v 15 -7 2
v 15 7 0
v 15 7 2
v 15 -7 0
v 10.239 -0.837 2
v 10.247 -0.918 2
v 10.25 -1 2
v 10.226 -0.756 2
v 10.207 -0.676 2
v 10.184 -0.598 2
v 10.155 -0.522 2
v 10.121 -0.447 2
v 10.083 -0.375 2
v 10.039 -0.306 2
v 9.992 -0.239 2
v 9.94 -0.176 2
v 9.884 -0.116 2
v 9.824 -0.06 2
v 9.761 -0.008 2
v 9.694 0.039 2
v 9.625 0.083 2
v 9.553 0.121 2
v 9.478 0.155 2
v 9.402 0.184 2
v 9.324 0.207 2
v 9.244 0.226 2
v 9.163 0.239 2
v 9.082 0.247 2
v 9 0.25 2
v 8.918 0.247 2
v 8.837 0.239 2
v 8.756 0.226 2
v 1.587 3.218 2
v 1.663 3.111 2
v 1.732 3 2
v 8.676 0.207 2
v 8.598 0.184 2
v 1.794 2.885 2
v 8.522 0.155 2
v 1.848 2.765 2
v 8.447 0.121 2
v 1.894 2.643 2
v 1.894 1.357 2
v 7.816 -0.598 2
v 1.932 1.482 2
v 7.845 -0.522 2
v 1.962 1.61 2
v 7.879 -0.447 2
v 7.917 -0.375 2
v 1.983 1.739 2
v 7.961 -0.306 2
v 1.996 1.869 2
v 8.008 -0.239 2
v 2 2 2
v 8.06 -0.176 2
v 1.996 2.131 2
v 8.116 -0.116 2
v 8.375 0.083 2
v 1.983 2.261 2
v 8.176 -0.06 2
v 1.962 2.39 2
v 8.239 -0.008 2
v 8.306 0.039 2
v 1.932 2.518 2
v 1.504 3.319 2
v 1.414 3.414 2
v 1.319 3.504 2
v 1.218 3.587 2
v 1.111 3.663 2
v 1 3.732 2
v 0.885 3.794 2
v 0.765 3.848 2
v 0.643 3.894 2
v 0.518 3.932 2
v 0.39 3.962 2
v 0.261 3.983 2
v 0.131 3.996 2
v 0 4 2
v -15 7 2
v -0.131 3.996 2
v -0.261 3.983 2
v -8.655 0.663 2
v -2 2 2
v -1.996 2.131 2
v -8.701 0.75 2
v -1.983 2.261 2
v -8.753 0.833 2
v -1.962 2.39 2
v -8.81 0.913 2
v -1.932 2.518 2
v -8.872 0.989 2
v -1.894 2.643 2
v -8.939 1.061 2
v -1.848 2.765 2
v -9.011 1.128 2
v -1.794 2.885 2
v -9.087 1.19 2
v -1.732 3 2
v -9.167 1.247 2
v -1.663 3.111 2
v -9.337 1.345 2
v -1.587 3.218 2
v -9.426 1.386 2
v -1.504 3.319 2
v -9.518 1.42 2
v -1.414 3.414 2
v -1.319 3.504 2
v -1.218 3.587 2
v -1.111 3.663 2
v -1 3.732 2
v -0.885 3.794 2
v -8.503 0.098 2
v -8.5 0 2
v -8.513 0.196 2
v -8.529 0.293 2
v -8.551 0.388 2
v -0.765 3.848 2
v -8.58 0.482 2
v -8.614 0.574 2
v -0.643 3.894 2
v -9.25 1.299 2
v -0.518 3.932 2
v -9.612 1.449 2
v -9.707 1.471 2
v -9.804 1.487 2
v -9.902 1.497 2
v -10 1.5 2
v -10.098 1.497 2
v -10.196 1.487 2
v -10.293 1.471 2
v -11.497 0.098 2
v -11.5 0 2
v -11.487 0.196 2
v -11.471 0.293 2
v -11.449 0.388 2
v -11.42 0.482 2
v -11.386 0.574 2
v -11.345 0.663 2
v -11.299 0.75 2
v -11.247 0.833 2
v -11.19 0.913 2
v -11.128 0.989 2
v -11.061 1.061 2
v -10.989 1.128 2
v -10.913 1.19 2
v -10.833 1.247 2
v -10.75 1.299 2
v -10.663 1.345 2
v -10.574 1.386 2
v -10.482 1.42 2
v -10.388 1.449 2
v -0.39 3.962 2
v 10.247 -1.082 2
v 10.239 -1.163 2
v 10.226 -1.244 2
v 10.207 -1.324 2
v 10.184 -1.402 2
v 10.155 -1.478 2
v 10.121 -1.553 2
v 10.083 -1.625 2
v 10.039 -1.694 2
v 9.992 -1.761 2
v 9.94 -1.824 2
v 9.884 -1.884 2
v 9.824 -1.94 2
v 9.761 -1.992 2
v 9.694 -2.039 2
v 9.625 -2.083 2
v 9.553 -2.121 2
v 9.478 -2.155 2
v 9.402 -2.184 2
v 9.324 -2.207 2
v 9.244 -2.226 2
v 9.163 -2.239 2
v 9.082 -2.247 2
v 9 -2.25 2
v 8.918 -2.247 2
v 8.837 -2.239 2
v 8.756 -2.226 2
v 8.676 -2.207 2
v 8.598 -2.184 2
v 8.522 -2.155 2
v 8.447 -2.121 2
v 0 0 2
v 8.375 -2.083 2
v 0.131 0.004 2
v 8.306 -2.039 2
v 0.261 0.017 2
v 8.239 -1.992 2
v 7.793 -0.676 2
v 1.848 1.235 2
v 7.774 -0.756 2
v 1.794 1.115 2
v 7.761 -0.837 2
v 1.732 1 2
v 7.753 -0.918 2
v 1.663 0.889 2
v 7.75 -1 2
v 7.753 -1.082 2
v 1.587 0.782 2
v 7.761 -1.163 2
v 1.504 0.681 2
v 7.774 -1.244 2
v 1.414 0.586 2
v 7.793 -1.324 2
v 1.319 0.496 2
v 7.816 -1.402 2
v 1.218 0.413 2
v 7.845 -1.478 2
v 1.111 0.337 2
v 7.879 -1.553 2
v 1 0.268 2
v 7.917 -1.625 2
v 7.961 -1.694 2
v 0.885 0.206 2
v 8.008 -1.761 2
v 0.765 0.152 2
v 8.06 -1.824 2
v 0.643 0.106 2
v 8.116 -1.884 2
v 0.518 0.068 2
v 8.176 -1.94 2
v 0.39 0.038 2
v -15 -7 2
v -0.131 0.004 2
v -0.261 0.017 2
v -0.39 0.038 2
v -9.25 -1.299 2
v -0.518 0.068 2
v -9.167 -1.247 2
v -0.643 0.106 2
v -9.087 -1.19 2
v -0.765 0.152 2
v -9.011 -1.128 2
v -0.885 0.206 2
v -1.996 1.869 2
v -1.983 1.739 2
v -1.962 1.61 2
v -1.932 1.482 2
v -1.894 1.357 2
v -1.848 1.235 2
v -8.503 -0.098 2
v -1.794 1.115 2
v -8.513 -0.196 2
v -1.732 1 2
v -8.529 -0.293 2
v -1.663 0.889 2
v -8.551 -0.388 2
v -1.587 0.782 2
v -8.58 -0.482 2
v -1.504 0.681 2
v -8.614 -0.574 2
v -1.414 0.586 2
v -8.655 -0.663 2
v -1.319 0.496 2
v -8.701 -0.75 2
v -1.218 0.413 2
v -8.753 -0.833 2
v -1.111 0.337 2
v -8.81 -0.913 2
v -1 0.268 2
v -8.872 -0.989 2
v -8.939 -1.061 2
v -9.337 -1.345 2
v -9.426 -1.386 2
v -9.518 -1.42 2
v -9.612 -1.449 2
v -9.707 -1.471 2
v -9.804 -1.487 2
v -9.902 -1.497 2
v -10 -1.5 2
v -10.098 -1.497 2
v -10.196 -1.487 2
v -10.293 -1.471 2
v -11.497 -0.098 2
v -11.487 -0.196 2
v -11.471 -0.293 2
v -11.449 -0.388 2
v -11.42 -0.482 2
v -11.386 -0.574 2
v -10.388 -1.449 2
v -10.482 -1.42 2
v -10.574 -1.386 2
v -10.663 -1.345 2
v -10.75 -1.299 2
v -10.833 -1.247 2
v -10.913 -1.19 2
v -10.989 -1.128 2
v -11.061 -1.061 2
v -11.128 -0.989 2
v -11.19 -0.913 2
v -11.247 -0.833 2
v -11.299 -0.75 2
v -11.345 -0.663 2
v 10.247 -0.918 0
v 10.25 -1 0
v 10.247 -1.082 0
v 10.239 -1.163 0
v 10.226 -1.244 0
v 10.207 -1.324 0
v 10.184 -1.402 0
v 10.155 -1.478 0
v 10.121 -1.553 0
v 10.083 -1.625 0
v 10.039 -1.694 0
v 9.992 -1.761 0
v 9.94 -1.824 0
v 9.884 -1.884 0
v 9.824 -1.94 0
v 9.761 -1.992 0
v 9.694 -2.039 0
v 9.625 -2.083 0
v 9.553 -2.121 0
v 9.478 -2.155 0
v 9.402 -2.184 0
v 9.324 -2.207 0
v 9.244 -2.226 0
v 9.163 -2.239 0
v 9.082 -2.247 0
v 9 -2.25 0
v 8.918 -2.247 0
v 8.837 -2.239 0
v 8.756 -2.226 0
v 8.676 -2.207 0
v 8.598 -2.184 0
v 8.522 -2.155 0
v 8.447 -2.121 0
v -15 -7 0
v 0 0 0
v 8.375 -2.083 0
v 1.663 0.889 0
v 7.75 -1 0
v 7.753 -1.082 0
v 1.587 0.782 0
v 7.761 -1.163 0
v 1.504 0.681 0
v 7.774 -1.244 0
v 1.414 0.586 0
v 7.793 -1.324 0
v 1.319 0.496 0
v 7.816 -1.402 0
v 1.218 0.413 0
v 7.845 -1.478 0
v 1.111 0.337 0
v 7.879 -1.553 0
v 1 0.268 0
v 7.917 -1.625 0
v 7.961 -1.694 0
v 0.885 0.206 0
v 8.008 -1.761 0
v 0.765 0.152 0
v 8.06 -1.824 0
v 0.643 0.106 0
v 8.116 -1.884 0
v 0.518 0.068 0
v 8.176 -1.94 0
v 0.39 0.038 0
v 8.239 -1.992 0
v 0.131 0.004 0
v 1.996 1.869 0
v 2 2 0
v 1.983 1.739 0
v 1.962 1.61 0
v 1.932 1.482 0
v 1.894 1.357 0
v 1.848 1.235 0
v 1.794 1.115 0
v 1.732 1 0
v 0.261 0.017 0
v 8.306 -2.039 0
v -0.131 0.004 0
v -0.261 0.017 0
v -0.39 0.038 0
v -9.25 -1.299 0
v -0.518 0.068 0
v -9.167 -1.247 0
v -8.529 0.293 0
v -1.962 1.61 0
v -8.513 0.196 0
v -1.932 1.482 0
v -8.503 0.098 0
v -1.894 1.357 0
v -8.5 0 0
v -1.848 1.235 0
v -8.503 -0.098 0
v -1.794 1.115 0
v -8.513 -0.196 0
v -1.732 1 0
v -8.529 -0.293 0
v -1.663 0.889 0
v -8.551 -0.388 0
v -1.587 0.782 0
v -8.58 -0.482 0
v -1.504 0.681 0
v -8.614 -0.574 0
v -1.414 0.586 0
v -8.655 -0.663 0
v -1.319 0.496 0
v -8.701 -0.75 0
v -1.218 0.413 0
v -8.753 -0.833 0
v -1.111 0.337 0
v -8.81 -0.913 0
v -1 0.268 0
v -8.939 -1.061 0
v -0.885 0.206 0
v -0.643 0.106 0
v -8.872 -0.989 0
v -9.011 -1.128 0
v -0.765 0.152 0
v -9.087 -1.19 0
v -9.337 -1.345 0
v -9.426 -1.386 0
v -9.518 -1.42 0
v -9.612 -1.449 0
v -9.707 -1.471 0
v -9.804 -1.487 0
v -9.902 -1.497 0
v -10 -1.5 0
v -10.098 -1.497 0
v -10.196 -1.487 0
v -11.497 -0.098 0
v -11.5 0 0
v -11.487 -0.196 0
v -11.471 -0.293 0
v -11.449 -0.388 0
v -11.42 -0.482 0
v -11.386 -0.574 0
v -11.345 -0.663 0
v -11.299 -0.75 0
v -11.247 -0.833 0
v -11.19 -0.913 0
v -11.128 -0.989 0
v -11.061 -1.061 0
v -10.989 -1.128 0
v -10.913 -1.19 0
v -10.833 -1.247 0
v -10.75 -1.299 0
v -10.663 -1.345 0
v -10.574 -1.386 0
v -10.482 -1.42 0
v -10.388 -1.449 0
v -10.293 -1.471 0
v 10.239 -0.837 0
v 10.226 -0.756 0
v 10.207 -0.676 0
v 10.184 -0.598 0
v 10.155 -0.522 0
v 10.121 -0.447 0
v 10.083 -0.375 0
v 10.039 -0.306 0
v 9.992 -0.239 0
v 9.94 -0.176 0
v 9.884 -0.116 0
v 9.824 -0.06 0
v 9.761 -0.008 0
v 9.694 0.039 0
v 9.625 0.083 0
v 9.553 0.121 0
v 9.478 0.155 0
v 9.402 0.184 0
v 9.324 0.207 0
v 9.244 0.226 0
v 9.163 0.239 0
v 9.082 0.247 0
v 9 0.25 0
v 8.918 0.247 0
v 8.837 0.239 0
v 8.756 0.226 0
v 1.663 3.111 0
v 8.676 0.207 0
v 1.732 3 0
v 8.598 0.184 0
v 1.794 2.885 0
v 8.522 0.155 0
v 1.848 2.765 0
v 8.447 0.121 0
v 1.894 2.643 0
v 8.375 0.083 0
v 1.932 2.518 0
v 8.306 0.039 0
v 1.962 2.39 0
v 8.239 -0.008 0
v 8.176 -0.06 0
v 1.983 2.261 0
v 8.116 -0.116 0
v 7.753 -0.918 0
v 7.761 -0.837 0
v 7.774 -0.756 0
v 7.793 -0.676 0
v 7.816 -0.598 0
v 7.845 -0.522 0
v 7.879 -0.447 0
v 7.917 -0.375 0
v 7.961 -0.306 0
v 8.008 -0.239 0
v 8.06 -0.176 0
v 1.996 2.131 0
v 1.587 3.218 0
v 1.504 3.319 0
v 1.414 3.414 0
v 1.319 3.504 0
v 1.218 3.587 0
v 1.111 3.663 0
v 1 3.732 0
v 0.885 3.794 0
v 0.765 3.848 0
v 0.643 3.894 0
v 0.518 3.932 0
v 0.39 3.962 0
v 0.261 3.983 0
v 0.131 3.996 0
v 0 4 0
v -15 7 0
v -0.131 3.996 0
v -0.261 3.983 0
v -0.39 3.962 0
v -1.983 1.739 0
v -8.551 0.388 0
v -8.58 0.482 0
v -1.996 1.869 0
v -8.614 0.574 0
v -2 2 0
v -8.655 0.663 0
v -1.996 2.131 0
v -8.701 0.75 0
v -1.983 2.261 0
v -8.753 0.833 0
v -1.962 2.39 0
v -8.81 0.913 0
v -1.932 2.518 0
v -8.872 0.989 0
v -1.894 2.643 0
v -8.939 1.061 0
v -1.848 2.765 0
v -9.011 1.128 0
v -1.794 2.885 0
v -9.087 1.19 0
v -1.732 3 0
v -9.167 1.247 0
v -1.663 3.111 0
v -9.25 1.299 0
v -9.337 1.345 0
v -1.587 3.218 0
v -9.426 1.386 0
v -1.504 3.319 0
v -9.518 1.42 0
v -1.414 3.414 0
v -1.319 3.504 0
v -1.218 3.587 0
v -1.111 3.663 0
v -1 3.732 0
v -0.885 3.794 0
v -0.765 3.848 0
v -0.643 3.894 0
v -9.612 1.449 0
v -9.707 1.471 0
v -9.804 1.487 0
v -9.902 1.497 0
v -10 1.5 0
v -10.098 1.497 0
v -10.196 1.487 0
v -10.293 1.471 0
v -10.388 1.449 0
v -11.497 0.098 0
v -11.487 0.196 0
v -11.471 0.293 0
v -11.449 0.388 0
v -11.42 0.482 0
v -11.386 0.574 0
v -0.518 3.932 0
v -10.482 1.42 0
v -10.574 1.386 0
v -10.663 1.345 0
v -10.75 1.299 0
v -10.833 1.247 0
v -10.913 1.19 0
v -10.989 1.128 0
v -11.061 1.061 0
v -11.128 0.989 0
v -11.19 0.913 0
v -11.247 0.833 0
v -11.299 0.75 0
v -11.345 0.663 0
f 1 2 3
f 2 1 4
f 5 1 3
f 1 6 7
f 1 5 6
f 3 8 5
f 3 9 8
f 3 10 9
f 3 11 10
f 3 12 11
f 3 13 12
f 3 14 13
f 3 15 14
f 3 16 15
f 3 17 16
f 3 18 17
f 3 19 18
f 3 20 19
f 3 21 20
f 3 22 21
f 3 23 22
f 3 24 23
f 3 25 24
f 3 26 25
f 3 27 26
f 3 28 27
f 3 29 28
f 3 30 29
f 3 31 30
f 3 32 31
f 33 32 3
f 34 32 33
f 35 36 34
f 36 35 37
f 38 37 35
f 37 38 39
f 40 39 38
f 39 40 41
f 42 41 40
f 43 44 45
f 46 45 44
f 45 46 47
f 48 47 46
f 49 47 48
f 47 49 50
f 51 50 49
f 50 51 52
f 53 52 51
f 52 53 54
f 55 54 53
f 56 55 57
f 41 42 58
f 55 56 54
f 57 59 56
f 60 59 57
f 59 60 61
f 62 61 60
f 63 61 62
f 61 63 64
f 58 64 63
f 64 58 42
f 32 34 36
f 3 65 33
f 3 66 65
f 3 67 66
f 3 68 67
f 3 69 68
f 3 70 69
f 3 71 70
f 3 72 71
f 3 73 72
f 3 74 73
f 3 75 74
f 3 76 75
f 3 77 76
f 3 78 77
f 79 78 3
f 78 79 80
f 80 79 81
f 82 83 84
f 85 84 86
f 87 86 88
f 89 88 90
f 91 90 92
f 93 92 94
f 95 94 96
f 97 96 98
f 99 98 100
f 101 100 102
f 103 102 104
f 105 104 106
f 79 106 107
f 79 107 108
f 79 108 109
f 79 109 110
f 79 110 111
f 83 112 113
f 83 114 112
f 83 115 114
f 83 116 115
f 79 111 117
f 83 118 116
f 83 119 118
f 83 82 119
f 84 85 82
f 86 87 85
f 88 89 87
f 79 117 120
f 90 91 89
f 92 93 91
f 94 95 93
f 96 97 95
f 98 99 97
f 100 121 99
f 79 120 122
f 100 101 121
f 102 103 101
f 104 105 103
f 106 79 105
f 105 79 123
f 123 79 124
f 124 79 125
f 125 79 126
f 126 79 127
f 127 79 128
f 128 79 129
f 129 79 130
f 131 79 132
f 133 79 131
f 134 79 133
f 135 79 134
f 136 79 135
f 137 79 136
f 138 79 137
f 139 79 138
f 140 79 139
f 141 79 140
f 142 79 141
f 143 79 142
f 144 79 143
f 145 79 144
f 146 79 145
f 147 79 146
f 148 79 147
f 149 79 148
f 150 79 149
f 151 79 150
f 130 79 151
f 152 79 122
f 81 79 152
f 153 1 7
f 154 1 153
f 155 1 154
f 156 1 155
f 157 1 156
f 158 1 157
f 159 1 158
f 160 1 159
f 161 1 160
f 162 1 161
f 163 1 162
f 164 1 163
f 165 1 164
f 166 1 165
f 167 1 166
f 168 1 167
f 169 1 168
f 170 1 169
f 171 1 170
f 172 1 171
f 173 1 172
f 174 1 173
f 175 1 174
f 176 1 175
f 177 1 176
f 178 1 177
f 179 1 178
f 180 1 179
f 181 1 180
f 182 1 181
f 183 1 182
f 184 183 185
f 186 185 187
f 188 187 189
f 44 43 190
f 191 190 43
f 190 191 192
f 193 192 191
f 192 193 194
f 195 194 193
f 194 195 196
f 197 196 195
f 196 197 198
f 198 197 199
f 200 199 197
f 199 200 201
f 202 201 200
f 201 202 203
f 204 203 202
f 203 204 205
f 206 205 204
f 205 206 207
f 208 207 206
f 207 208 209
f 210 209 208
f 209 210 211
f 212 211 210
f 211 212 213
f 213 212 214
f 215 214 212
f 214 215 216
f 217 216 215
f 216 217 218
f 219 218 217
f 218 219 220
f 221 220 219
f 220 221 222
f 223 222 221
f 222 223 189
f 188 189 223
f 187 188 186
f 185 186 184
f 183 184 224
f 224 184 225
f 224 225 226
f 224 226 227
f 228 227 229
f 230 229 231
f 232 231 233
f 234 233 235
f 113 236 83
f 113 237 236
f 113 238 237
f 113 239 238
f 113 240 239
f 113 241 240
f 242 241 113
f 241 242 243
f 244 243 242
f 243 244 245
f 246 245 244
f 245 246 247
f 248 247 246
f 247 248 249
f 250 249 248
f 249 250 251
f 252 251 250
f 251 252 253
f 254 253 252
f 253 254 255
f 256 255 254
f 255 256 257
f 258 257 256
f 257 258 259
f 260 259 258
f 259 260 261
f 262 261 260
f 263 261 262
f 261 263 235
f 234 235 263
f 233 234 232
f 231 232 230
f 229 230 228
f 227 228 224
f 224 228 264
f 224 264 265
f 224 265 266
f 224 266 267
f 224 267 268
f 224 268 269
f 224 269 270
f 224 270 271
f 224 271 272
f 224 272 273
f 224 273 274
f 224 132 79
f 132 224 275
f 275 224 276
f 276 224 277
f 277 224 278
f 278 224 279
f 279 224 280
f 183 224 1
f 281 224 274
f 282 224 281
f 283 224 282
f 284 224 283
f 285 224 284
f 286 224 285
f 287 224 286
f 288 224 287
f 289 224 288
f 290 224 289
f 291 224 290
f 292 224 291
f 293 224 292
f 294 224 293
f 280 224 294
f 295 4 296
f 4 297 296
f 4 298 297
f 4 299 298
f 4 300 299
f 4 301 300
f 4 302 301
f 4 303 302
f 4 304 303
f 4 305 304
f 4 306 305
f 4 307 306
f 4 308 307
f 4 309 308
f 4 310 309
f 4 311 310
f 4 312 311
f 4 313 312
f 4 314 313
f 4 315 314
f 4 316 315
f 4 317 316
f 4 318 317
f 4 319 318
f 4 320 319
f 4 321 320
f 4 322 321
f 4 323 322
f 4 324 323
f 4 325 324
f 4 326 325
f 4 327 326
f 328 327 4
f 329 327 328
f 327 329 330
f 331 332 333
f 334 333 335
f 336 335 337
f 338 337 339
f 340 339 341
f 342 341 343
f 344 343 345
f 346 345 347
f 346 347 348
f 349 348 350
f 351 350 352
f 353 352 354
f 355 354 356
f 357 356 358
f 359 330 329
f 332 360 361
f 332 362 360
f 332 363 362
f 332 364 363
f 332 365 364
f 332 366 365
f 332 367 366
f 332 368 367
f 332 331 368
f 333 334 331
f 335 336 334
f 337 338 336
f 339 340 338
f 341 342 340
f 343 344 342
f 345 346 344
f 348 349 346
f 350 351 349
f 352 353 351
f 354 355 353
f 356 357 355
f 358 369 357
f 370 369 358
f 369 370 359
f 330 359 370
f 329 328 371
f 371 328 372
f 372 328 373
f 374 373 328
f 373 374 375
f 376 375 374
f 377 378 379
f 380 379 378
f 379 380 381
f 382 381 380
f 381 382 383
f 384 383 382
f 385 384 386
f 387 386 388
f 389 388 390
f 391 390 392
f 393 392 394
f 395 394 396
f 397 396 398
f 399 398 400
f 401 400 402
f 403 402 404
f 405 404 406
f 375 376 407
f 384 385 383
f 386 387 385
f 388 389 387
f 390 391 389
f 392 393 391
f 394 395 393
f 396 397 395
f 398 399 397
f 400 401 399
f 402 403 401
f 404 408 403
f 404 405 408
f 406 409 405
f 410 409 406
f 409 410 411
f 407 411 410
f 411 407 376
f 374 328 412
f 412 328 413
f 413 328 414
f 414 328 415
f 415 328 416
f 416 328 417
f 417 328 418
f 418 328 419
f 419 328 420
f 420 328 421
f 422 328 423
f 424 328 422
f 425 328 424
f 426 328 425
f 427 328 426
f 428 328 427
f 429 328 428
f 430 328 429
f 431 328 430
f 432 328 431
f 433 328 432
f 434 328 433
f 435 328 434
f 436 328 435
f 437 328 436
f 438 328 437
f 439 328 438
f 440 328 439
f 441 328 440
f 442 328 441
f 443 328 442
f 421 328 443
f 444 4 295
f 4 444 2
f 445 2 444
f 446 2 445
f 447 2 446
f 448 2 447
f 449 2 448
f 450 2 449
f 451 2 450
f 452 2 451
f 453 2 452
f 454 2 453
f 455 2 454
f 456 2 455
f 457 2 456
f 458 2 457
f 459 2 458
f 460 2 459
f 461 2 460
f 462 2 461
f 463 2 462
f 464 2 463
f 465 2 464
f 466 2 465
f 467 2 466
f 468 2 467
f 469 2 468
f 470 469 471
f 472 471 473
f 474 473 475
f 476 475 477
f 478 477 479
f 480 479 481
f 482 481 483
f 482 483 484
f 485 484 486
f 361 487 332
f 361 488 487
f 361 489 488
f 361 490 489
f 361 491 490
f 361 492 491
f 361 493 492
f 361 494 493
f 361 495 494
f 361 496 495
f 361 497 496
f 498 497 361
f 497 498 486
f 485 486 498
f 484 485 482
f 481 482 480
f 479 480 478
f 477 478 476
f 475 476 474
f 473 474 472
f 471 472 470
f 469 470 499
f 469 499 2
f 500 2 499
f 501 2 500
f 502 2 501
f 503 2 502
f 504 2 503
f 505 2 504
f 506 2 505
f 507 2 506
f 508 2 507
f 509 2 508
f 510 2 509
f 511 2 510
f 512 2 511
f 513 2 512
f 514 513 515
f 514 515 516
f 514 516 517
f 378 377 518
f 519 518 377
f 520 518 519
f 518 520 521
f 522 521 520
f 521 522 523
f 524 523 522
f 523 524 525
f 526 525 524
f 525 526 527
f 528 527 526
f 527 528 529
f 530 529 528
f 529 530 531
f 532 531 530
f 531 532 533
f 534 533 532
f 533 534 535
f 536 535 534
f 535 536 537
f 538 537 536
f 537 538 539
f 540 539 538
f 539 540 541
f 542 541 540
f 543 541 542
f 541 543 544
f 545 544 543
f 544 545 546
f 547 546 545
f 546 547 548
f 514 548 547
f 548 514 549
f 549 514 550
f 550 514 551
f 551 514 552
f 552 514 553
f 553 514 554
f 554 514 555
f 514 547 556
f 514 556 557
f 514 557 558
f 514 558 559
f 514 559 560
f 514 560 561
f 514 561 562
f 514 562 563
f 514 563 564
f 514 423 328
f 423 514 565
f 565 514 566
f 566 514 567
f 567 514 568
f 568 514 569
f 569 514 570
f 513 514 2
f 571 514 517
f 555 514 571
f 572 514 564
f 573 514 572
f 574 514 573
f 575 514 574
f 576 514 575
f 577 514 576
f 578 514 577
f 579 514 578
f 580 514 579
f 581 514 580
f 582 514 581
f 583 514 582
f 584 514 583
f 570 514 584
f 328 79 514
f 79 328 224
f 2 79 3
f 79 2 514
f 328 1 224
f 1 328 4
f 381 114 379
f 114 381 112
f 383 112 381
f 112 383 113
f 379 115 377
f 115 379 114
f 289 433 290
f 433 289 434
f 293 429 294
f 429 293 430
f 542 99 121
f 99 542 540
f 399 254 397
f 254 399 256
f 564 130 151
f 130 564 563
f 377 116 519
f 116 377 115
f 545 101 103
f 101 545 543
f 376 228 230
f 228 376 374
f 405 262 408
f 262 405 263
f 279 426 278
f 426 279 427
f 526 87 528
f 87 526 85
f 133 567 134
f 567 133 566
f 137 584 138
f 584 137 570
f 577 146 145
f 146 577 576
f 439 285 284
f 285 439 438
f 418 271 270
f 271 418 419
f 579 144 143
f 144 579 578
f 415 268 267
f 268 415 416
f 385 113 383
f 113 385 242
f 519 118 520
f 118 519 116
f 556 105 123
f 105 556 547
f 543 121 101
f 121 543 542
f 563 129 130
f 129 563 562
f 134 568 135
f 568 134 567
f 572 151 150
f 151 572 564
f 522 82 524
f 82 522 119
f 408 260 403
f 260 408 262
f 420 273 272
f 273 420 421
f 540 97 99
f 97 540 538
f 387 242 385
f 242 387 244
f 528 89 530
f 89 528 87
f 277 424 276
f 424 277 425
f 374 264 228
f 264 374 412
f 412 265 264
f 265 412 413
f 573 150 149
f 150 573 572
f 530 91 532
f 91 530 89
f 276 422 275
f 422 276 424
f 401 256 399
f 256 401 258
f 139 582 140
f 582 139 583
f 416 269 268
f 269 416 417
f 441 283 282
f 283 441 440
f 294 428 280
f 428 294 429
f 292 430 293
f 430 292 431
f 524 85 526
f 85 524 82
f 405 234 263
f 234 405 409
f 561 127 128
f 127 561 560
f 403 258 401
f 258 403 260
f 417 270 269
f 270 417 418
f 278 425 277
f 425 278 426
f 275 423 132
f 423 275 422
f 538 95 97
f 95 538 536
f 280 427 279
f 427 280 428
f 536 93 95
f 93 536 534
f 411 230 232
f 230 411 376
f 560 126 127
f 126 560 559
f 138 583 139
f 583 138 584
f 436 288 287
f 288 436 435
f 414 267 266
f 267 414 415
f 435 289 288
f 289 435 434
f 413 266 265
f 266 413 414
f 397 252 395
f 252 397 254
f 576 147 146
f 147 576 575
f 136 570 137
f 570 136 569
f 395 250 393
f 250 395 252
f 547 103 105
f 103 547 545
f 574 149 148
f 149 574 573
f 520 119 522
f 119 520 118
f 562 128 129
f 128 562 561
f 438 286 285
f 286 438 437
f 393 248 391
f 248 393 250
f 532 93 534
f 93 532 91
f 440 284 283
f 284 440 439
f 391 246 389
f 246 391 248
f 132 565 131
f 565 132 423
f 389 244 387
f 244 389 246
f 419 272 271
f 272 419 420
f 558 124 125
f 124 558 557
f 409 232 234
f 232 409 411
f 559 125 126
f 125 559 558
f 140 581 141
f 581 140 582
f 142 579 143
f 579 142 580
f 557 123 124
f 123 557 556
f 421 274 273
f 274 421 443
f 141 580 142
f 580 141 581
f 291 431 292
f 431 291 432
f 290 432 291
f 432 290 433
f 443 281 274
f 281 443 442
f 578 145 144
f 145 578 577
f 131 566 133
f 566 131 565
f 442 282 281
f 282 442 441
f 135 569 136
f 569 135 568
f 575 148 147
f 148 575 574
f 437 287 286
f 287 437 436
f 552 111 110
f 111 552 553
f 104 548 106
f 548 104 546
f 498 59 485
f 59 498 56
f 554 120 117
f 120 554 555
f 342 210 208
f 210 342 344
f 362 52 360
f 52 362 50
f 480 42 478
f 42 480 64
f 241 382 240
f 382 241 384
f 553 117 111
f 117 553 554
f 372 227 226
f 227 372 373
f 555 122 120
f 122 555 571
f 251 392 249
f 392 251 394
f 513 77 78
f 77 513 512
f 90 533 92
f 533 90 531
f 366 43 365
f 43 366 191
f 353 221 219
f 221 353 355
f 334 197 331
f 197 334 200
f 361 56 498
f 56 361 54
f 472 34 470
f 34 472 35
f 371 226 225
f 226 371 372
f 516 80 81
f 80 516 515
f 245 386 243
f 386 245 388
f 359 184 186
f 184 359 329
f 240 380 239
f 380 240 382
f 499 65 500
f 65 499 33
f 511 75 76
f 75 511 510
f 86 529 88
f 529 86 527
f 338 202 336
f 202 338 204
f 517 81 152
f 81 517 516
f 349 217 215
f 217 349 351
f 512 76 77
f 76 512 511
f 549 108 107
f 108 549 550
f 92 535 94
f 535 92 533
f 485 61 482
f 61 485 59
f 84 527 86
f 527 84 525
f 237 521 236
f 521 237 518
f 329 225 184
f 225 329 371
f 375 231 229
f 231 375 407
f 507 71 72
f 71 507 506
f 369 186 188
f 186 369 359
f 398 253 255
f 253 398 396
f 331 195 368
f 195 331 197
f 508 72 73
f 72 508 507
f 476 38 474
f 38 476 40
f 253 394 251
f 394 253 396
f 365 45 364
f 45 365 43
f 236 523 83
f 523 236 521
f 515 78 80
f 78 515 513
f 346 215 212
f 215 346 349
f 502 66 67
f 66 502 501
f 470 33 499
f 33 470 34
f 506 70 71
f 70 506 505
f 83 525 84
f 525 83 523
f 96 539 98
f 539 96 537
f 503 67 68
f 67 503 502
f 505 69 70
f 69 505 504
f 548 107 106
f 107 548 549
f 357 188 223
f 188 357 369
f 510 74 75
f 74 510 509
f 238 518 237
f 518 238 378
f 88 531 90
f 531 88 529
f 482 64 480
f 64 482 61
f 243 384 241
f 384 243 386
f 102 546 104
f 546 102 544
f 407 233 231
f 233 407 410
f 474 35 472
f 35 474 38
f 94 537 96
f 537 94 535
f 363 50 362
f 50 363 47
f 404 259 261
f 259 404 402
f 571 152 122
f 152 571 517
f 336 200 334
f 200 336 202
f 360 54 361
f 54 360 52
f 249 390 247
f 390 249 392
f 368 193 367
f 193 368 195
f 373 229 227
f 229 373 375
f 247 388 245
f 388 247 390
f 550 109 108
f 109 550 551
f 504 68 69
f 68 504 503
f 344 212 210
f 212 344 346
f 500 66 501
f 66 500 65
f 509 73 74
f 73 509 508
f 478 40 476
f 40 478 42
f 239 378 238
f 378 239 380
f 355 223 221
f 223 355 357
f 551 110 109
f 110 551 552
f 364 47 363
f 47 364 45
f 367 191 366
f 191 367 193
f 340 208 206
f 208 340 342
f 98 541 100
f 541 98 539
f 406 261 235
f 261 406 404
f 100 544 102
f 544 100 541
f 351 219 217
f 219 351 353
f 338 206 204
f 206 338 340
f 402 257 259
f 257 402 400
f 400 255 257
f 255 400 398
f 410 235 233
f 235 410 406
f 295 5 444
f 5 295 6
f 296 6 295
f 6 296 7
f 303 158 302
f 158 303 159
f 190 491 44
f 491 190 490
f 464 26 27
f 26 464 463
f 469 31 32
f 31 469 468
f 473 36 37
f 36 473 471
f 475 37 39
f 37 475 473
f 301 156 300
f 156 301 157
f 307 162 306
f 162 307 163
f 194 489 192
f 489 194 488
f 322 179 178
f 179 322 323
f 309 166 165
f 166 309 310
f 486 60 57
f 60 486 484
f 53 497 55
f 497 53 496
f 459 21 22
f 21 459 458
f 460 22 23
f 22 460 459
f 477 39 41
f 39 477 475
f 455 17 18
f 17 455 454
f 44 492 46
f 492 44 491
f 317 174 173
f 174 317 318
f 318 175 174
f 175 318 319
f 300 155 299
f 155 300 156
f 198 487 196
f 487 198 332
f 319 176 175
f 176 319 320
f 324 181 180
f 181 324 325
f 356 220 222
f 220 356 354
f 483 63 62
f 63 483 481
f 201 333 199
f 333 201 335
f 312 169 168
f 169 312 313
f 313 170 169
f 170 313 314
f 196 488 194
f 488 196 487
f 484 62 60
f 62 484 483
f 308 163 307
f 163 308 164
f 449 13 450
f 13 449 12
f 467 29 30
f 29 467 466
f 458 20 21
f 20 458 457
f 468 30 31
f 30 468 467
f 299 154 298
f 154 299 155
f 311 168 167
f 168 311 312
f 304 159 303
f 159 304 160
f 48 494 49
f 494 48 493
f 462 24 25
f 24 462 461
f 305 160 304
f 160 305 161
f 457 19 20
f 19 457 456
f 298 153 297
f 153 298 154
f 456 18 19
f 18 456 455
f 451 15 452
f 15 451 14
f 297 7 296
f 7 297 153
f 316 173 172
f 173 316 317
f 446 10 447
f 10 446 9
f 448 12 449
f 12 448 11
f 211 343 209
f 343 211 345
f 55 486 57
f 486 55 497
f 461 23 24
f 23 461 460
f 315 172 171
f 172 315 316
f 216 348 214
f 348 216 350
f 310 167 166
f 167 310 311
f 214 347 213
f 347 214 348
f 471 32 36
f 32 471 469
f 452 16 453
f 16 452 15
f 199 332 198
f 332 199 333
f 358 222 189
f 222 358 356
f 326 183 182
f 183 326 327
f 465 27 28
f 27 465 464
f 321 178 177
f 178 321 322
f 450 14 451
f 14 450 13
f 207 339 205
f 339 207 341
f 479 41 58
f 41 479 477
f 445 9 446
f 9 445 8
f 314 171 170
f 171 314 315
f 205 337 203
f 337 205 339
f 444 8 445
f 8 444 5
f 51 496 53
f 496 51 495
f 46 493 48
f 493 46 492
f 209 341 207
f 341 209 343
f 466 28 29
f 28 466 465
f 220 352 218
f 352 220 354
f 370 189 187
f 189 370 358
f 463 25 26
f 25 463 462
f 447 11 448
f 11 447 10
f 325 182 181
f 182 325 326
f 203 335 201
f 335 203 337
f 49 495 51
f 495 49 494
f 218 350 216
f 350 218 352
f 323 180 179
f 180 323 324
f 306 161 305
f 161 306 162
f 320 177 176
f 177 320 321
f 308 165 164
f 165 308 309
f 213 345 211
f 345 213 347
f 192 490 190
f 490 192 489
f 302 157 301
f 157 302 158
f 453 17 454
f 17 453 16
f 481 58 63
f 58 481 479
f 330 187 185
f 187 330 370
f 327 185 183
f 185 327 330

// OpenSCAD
// Auto-generated from tests/data/feature_fixtures_manifest.json
// fixture: plate_three_holes
// fixture_type: plate
// description: Three irregularly spaced holes (no pattern) to test hole counting without forcing a linear pattern.
$fn = 96;

plate_size = [30.000000, 14.000000, 2.000000];
plate_origin = [-15.000000, -7.000000, 0.000000];

module through_hole(center, diameter, height) {
  translate(center) cylinder(d=diameter, h=height, center=false);
}

module through_slot(start, end, width, height) {
  hull() {
    through_hole(start, width, height);
    through_hole(end, width, height);
  }
}

module counterbore_hole(center, through_d, bore_d, bore_depth, plate_thickness) {
  translate([center[0], center[1], -0.1])
    cylinder(d=through_d, h=plate_thickness + 0.2, center=false);
  translate([center[0], center[1], plate_thickness - bore_depth])
    cylinder(d=bore_d, h=bore_depth + 0.1, center=false);
}

difference() {
  translate(plate_origin) cube(plate_size);
  through_hole([-10.000000, 0.000000, -0.100000], 3.000000, 2.200000);  // hole_0
  through_hole([0.000000, 2.000000, -0.100000], 4.000000, 2.200000);  // hole_1
  through_hole([9.000000, -1.000000, -0.100000], 2.500000, 2.200000);  // hole_2
}
